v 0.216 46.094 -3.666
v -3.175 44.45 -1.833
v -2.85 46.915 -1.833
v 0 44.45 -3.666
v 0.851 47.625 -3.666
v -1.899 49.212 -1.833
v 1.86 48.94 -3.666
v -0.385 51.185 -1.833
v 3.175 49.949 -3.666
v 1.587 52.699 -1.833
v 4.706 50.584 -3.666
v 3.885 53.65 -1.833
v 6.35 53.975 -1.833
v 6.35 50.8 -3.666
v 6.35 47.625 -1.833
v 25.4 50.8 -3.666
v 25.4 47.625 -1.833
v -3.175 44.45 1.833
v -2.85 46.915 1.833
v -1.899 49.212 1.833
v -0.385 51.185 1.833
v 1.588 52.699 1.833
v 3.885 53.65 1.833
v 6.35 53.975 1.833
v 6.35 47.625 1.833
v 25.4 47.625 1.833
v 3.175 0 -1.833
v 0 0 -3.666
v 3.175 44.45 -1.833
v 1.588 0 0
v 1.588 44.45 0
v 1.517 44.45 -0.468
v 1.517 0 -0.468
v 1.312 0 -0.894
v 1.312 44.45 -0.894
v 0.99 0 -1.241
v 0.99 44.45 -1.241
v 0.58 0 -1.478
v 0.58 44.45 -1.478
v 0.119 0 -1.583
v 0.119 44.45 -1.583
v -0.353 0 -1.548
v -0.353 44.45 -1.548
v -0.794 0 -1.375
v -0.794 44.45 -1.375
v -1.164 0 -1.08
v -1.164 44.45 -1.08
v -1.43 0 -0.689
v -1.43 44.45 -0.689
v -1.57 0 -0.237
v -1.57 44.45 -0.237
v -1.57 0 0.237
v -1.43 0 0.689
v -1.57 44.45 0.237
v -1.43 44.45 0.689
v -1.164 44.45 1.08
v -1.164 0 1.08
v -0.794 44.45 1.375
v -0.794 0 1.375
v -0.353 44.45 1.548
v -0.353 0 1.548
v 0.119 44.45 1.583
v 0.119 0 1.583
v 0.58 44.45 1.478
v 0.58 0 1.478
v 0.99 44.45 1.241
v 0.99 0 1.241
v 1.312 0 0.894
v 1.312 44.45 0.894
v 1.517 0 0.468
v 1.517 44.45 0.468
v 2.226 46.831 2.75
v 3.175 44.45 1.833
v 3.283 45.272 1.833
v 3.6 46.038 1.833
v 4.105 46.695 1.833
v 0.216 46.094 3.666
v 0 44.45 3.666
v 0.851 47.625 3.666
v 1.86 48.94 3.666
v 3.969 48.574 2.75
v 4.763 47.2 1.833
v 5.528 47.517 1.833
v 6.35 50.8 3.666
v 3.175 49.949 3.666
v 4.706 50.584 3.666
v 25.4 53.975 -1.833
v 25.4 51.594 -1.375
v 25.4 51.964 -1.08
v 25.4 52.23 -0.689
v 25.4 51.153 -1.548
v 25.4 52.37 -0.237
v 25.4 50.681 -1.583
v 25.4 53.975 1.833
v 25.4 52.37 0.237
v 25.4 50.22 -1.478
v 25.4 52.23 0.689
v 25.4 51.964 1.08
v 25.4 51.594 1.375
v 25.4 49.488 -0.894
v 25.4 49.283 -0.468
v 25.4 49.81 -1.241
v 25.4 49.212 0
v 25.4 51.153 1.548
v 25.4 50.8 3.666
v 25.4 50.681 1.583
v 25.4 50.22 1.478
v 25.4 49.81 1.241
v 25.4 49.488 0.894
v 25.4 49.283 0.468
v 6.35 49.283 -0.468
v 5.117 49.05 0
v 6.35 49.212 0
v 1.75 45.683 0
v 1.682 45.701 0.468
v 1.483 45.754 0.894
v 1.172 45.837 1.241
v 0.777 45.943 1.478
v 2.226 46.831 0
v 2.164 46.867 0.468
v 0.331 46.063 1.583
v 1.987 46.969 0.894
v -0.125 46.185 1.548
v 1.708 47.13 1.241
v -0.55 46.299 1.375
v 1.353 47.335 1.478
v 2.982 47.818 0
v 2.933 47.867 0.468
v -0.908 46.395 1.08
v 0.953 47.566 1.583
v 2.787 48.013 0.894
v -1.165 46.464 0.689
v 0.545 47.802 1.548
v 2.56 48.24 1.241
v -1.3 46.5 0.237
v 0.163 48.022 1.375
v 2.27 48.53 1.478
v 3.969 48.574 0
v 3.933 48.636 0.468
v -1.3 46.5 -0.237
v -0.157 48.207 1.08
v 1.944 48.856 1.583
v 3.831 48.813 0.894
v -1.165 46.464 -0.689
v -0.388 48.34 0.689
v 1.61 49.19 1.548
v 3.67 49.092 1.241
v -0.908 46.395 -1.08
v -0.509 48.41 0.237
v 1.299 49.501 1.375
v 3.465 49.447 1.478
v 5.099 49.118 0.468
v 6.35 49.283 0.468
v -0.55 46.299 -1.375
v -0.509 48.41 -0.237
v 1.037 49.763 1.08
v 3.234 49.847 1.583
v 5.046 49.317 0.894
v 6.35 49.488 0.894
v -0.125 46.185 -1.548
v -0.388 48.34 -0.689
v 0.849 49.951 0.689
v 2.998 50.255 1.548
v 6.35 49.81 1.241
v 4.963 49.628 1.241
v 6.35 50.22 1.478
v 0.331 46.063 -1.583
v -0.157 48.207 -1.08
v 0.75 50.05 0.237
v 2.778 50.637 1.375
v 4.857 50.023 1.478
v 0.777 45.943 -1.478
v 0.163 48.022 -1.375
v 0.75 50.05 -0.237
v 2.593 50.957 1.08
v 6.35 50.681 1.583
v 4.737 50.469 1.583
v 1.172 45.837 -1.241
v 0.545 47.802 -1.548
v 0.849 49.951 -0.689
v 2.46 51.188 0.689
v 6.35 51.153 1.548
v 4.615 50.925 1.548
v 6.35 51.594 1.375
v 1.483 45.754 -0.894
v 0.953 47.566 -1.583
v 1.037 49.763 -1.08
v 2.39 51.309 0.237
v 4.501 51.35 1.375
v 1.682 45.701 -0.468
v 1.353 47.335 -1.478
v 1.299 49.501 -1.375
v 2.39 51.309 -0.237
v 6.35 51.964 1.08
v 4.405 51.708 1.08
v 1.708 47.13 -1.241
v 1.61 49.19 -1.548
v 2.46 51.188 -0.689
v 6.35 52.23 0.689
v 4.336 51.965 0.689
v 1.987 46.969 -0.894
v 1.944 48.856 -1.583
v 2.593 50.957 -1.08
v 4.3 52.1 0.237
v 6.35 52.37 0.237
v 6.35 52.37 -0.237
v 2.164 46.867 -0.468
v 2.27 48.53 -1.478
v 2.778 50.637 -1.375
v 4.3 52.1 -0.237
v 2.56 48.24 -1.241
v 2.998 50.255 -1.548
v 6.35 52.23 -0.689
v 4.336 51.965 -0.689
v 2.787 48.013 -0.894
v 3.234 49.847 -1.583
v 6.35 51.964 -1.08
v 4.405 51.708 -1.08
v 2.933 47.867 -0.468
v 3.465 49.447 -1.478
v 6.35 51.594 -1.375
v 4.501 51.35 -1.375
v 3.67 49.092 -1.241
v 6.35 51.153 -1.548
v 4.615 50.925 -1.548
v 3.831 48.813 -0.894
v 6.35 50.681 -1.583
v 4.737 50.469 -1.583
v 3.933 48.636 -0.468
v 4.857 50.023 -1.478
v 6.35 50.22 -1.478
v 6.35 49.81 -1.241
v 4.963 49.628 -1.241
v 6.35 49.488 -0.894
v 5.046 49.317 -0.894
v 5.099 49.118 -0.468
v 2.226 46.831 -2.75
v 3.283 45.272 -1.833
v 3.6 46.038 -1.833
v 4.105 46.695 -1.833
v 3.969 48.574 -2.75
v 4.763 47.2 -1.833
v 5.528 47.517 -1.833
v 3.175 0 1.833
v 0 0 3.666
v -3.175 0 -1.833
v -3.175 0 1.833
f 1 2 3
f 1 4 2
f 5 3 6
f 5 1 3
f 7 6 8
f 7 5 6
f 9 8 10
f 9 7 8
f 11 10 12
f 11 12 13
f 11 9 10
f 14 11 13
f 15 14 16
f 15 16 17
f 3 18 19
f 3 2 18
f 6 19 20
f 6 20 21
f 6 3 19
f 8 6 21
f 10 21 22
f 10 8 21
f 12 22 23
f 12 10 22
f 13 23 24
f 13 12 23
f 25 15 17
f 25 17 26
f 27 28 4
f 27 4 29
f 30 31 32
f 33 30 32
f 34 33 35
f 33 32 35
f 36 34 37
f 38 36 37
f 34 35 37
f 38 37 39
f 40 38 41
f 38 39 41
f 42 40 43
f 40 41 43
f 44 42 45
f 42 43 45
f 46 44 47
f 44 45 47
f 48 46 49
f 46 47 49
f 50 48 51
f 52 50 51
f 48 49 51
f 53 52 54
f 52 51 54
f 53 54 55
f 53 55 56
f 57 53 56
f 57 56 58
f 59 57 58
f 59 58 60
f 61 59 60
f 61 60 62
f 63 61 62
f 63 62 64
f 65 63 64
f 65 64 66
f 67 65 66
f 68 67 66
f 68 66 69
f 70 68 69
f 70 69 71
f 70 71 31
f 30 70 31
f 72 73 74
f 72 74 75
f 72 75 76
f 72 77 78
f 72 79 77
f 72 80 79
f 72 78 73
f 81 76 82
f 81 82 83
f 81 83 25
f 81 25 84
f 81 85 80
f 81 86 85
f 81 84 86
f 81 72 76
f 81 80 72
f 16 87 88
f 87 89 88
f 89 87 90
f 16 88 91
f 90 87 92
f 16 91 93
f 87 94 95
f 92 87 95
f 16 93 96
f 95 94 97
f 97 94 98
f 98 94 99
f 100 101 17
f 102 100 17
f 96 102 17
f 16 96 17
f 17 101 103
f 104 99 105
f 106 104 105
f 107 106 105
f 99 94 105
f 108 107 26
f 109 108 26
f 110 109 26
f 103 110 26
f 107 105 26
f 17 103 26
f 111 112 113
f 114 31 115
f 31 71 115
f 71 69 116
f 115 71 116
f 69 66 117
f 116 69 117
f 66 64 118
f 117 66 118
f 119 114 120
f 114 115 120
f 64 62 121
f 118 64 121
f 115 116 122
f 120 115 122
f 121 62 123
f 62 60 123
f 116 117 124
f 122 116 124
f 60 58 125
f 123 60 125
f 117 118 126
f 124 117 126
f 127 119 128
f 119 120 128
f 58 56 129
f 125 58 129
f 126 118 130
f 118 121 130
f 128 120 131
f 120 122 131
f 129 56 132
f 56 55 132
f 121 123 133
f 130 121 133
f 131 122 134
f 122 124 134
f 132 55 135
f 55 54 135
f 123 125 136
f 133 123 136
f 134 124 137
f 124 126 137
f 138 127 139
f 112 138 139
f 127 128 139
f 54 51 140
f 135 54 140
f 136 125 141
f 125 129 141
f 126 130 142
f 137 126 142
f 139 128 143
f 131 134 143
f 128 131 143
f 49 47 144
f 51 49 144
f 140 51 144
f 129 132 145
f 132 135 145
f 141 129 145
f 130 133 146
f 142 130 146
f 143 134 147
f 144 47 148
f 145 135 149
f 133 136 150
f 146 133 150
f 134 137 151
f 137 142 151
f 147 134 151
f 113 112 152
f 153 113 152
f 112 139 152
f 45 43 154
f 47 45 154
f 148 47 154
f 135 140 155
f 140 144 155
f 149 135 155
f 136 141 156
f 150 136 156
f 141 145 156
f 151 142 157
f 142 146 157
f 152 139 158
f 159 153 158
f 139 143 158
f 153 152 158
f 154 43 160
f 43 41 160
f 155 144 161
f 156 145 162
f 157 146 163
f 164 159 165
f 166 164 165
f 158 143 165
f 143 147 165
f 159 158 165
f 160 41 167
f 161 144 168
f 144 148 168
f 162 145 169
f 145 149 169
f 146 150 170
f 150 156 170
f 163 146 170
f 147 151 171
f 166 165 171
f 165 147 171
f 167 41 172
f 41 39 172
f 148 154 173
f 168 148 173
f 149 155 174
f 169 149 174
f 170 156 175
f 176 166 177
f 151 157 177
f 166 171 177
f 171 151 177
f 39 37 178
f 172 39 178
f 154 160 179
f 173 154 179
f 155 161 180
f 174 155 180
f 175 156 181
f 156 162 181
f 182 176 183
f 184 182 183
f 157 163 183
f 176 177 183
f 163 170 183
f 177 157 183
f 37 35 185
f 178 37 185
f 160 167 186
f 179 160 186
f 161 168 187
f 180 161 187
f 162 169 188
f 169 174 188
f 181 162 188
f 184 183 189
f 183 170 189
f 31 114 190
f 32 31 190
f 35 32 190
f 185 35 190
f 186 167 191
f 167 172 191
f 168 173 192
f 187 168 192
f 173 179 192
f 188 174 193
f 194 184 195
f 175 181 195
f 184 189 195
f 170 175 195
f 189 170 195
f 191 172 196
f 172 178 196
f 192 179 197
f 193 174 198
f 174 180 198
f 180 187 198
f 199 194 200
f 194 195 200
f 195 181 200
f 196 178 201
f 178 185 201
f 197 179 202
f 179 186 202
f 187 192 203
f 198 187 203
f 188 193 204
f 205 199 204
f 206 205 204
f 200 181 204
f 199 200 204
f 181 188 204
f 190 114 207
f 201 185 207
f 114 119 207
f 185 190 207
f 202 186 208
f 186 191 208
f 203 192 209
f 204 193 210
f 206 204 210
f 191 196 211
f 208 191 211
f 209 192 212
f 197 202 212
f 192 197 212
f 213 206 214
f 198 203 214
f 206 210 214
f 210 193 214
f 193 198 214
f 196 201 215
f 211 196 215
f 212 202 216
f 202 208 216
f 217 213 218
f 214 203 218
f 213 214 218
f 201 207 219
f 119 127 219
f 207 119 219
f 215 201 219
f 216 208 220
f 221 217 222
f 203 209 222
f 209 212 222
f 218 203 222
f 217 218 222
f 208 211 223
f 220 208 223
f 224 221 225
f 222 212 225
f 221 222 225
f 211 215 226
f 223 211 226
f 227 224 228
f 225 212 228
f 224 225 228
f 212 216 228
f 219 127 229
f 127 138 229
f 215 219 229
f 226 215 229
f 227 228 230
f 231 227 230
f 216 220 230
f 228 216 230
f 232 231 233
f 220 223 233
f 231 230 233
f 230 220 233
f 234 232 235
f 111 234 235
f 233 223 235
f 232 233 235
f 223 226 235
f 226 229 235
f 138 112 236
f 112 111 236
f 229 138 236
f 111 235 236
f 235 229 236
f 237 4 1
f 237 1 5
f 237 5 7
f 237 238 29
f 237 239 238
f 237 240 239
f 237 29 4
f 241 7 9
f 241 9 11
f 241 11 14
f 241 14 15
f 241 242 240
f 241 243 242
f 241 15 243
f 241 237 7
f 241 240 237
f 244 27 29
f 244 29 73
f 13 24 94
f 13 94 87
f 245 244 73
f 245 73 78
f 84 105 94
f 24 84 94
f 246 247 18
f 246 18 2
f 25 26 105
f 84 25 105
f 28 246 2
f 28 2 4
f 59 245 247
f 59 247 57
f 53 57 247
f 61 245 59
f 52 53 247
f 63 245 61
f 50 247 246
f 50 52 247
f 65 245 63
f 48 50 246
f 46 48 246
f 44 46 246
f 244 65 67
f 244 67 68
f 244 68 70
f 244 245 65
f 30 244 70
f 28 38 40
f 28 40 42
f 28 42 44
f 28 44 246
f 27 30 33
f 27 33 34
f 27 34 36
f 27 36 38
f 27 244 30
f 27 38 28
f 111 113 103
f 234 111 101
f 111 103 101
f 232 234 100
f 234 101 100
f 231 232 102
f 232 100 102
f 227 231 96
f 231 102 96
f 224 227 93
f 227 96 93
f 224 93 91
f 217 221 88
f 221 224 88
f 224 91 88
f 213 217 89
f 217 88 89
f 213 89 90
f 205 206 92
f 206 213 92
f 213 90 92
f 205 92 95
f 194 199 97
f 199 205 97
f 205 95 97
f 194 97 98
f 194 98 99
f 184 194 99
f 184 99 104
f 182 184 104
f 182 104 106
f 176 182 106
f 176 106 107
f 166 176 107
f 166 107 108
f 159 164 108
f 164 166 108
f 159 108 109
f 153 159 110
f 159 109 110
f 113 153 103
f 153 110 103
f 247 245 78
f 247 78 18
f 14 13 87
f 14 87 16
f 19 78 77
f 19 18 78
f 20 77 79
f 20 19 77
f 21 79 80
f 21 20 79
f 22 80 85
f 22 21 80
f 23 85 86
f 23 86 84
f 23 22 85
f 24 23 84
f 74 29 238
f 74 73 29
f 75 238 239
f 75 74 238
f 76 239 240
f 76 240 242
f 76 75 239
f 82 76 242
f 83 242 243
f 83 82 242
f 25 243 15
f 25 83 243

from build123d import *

# Parameters (mm, degrees)
F3_R = 1.5875


with BuildPart() as f2:
    # F2: sweep along a path in F1
    with BuildLine(Plane.XY) as f2_path:
        Line((0, 0), (0, 44.45))
        ThreePointArc((0, 44.45), (1.8598719395, 48.9401280605), (6.35, 50.8))
        Line((6.35, 50.8), (25.4, 50.8))
    # F0 (on Front) → F2 (sweep)
    with BuildSketch(Plane.XZ):
        Polygon((3.175, -1.8330871047), (3.175, 1.8330871047), (0, 3.6661742094), (-3.175, 1.8330871047), (-3.175, -1.8330871047), (0, -3.6661742094), align=None)
    sweep(path=f2_path.line)

    # F4: sweep along a path in F4_path
    with BuildLine(Plane(origin=(3.175, 0, -1.8330871047), x_dir=(-1, 0, 0), z_dir=(0, 0, 1))) as f4_path:
        Line((0, 0), (0, -44.45))
        ThreePointArc((0, -44.45), (-0.9299359697, -46.6950640303), (-3.175, -47.625))
        Line((-3.175, -47.625), (-22.225, -47.625))
    # F3 (on face) → F4 (sweep, cut)
    with BuildSketch(Plane.XZ):
        Circle(F3_R)
    sweep(path=f4_path.line, mode=Mode.SUBTRACT)


solid = f2.part
